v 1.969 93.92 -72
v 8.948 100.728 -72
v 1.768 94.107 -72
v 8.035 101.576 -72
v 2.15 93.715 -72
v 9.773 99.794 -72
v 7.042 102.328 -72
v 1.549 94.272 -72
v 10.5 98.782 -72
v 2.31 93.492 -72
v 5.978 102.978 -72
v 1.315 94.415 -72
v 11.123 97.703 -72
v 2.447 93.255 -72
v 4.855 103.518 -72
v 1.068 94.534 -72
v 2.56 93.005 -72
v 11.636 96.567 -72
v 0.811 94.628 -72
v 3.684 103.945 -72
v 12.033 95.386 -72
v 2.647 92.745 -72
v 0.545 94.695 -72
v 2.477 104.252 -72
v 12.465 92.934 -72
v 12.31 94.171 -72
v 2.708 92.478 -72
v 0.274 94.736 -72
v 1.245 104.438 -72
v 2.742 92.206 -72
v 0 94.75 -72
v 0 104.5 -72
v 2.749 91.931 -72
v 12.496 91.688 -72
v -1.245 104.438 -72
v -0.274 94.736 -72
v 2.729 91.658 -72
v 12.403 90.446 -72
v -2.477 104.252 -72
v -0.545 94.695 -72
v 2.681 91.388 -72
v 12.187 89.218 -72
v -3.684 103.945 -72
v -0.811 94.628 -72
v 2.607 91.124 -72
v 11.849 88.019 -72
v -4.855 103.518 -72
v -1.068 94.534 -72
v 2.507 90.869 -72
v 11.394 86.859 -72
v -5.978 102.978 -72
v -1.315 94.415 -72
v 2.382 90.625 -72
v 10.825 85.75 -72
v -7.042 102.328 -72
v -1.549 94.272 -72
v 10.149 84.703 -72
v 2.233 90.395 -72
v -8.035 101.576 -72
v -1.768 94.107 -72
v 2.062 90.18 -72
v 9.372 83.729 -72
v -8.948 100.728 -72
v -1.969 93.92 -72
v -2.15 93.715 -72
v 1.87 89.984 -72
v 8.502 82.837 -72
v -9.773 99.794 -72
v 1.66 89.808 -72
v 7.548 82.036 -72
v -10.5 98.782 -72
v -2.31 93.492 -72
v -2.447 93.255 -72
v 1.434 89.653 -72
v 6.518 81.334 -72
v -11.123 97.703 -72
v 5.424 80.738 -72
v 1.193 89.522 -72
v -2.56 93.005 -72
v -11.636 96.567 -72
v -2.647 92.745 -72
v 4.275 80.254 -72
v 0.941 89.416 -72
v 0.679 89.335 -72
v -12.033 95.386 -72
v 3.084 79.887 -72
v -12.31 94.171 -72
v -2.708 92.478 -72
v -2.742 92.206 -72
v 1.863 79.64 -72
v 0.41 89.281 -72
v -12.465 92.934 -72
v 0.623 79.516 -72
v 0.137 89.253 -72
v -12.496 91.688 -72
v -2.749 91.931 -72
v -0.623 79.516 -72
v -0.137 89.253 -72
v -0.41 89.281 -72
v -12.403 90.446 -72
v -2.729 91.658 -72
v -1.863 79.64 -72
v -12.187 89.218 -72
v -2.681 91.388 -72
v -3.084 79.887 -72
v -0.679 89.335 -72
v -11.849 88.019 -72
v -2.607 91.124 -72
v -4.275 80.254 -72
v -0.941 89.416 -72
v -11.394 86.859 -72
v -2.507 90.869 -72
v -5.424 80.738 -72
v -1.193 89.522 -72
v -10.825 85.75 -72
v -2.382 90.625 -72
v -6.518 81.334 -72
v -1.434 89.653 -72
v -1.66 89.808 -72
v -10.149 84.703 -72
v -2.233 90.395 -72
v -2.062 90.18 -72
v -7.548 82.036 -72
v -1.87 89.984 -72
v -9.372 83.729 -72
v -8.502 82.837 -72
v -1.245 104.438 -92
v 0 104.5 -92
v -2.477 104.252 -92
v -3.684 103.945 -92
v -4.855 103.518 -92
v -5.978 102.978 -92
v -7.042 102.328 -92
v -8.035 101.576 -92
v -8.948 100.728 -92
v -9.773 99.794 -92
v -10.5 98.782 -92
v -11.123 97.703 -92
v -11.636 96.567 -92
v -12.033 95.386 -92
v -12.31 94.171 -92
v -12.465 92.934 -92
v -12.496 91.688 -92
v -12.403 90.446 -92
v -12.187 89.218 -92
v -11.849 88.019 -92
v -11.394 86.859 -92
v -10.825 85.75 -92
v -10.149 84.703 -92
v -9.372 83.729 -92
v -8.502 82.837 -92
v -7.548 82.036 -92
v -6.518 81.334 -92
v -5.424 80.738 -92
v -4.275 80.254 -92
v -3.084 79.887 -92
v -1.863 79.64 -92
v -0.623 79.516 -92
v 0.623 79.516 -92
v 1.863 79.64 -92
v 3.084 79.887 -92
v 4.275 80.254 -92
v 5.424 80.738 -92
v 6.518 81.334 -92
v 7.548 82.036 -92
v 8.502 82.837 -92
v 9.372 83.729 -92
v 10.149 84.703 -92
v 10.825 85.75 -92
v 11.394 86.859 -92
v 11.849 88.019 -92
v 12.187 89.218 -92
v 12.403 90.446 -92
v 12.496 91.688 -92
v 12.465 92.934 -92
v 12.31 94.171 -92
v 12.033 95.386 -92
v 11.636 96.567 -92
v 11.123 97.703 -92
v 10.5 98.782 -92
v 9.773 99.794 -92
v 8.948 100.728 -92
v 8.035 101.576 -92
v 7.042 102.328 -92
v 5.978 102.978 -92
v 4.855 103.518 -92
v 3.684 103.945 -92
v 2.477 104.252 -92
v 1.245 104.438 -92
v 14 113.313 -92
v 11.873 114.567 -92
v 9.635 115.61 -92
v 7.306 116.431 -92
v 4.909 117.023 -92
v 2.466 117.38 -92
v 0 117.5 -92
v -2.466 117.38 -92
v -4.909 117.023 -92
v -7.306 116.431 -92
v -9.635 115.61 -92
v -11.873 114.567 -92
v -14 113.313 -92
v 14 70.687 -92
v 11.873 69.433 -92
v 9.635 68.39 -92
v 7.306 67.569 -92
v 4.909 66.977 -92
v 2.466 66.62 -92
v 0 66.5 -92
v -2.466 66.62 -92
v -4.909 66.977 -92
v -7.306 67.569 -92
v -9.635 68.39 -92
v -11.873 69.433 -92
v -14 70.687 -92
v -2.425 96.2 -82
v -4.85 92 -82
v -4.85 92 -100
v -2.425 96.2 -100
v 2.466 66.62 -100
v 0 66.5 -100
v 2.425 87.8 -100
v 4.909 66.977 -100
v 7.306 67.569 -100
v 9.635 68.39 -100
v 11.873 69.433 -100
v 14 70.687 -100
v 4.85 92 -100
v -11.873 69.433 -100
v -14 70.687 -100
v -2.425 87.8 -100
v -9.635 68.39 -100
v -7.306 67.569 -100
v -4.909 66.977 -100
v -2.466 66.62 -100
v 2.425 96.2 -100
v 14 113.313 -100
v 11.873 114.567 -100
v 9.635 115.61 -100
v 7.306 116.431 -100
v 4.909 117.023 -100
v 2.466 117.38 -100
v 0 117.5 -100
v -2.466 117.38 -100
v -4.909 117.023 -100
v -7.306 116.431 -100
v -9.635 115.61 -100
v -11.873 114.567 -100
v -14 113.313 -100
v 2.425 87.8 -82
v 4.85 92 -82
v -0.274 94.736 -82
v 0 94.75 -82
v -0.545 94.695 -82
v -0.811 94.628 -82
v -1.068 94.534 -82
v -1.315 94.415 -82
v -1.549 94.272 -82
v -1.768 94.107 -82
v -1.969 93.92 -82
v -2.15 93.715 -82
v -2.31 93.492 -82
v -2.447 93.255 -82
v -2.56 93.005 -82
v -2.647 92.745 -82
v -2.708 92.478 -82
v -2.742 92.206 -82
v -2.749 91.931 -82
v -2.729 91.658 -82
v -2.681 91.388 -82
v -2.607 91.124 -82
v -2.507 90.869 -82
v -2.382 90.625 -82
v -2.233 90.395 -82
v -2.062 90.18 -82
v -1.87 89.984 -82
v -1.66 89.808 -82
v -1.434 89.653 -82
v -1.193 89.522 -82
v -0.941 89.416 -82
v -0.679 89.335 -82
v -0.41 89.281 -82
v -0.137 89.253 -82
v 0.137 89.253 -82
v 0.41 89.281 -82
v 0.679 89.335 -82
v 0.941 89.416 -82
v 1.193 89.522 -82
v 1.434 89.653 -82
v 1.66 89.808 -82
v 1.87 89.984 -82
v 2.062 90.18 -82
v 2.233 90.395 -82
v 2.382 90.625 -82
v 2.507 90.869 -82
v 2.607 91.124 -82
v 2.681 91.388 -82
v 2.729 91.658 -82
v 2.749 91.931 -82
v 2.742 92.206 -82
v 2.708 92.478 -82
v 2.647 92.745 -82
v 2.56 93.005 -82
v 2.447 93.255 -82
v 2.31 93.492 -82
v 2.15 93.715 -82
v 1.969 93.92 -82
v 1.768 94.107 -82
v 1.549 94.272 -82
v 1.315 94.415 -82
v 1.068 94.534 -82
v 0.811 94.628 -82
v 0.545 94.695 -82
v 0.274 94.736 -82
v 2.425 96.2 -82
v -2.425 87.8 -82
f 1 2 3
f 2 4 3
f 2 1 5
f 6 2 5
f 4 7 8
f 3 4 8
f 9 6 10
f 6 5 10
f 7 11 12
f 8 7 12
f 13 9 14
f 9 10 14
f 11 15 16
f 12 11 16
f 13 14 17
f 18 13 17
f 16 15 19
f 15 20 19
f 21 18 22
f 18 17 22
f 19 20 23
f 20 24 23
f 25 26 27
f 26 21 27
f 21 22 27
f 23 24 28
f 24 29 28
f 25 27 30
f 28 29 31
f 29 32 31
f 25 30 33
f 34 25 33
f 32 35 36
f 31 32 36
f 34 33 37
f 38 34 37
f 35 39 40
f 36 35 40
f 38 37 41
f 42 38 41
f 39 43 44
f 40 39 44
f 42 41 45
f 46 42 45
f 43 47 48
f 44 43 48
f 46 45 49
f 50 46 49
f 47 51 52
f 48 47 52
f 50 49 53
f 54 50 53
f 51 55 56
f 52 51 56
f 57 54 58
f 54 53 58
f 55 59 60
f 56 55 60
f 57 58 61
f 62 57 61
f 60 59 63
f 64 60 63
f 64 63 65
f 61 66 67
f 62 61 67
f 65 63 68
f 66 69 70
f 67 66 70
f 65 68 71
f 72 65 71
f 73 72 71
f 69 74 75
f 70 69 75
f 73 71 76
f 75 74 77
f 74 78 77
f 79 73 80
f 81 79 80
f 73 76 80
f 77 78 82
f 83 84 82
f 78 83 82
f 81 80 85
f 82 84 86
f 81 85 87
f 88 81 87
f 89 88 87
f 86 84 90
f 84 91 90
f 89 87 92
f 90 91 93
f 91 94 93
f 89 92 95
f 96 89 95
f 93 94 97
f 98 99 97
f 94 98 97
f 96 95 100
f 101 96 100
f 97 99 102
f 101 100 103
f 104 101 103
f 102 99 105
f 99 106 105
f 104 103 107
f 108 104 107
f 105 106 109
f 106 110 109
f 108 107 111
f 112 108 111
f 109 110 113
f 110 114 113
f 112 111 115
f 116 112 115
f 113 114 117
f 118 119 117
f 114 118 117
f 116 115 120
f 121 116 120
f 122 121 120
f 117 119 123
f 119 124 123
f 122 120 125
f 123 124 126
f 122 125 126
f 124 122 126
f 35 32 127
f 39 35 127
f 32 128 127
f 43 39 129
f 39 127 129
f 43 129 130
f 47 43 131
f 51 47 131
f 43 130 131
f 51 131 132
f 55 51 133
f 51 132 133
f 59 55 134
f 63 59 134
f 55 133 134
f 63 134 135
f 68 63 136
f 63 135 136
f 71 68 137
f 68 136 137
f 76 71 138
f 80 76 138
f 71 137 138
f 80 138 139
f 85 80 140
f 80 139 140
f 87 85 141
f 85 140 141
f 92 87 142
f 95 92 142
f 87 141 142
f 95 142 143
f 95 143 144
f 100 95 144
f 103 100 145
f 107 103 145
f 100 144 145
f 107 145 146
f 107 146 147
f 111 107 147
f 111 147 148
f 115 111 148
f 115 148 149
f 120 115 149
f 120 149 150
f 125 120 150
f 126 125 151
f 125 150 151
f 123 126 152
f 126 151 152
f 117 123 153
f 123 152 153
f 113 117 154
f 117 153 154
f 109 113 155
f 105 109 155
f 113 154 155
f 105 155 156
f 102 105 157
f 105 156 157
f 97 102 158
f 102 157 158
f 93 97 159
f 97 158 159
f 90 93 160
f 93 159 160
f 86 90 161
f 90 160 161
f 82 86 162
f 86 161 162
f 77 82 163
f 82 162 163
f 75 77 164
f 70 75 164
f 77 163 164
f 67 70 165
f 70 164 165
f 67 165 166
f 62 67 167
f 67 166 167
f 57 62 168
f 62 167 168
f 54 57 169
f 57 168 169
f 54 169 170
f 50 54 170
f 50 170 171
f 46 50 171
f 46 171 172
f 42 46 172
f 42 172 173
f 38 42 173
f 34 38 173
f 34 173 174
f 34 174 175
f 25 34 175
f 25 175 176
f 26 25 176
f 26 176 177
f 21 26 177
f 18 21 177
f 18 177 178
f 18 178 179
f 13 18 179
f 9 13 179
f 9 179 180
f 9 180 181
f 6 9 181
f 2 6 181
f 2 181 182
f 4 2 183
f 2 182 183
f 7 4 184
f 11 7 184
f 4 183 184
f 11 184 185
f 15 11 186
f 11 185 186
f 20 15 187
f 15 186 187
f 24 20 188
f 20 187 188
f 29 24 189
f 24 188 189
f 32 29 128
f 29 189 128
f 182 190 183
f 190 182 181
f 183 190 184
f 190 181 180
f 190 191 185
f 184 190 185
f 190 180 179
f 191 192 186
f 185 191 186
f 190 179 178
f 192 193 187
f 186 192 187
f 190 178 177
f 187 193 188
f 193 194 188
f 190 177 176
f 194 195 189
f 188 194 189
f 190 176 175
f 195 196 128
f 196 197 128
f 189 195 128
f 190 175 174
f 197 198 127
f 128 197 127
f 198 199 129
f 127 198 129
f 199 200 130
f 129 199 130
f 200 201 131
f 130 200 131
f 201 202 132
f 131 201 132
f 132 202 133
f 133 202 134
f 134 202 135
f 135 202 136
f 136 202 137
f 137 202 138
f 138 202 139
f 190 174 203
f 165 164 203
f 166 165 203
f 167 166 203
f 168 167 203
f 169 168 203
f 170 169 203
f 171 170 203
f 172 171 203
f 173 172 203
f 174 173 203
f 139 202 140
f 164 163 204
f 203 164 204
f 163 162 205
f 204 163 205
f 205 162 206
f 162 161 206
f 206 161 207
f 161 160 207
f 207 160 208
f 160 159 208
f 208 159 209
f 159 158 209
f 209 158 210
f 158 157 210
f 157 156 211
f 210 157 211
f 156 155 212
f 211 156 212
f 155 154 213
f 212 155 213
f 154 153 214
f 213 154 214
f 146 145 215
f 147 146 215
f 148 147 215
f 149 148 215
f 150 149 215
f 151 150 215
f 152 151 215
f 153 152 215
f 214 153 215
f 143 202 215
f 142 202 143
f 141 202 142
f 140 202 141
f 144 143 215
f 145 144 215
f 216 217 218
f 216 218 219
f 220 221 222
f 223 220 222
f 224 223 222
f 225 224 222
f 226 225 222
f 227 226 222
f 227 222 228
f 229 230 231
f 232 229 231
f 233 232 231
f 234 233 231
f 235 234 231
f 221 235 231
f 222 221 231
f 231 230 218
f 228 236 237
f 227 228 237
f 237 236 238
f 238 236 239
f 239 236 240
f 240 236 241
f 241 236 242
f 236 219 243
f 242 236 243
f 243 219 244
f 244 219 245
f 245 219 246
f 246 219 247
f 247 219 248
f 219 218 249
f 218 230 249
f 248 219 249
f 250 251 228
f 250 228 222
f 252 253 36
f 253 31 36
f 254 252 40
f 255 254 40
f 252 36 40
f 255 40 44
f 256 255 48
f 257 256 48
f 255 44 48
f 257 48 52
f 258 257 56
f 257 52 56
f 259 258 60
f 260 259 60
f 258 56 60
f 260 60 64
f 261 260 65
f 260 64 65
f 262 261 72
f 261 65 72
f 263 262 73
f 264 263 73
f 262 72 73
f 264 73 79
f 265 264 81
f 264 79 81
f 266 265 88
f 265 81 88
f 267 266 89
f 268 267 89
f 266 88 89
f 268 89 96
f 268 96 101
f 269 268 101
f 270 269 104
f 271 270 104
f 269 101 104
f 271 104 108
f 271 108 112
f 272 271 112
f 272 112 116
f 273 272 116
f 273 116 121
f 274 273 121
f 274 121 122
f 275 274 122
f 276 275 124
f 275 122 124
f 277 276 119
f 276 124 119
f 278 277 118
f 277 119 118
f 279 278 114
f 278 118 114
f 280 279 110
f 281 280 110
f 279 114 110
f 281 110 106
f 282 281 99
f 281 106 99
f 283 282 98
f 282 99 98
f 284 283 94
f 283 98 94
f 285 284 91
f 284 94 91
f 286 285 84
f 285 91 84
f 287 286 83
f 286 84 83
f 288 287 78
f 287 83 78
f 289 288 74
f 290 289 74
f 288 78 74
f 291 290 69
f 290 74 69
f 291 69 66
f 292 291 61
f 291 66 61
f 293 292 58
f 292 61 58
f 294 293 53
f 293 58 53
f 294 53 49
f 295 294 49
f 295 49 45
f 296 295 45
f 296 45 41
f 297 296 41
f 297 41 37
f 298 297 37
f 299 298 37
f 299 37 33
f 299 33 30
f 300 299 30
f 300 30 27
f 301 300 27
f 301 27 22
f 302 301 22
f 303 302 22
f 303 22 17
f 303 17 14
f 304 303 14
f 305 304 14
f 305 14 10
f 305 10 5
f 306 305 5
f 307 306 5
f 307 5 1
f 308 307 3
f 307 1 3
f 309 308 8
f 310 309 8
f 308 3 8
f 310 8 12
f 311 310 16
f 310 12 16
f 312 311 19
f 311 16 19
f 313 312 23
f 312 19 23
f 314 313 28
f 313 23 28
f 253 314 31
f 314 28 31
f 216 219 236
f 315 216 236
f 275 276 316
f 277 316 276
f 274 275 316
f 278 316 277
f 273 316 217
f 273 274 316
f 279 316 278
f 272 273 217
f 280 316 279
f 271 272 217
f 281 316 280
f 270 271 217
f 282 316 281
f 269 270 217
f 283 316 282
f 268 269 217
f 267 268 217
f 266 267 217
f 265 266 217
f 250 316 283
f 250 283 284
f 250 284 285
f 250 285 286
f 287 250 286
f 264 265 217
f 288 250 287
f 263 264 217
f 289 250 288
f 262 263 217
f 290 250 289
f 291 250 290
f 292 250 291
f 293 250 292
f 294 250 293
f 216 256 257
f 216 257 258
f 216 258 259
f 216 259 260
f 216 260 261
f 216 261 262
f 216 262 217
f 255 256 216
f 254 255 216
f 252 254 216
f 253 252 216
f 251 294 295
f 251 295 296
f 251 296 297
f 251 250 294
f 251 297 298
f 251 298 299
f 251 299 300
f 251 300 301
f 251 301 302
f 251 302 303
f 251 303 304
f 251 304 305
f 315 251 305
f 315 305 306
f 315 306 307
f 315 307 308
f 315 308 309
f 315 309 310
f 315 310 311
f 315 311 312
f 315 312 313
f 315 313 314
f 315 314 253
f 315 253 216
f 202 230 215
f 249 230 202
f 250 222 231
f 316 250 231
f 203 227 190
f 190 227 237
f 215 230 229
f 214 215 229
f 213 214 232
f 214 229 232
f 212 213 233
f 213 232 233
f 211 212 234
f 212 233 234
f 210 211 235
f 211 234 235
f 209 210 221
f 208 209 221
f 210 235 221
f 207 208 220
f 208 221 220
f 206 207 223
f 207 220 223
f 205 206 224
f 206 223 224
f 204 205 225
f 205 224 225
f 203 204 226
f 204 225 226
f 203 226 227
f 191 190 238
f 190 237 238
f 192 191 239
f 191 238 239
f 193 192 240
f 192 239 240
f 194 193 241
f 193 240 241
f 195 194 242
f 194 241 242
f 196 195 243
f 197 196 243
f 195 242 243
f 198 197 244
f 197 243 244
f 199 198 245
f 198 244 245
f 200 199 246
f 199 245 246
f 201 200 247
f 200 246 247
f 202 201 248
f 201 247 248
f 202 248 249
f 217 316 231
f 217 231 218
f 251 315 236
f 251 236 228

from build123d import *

# Parameters (mm, degrees)
SKETCH151_W     = 65
SKETCH151_H     = 65
SKETCH151_W_2   = 53.065996
SKETCH151_H_2   = 28
POCKET099_DEPTH = 28.001
POCKET100_DEPTH = 18


with BuildPart() as part:
    # Sketch103 → Revolution002 (revolve)
    with BuildSketch(Plane.YZ):
        Polygon((2.75, 0), (12.5, 0), (12.5, -20), (25.5, -20), (25.5, -28), (2.75, -28), align=None)
    revolve(axis=Axis((0, 0, 0), (0, 0, 1)))

    # Sketch151 (on Face5 of Revolution002) → Pocket099 (cut, through all)
    with BuildSketch(Plane.YX.offset(28)):
        Rectangle(SKETCH151_W, SKETCH151_H)
        Rectangle(SKETCH151_W_2, SKETCH151_H_2, mode=Mode.SUBTRACT)
    extrude(amount=-POCKET099_DEPTH, mode=Mode.SUBTRACT)

    # Sketch142 (on Face5 of Revolution002) → Pocket100 (cut)
    with BuildSketch(Plane.YX.offset(28)):
        Polygon((4.2, 2.424871), (0, 4.849742), (-4.2, 2.424871), (-4.2, -2.424871), (0, -4.849742), (4.2, -2.424871), align=None)
    extrude(amount=-POCKET100_DEPTH, mode=Mode.SUBTRACT)


with BuildPart() as part_1:
    # Body022019 placement: moved
    add(part.part.moved(Location((0, 92, -72))))


solid = part_1.part
